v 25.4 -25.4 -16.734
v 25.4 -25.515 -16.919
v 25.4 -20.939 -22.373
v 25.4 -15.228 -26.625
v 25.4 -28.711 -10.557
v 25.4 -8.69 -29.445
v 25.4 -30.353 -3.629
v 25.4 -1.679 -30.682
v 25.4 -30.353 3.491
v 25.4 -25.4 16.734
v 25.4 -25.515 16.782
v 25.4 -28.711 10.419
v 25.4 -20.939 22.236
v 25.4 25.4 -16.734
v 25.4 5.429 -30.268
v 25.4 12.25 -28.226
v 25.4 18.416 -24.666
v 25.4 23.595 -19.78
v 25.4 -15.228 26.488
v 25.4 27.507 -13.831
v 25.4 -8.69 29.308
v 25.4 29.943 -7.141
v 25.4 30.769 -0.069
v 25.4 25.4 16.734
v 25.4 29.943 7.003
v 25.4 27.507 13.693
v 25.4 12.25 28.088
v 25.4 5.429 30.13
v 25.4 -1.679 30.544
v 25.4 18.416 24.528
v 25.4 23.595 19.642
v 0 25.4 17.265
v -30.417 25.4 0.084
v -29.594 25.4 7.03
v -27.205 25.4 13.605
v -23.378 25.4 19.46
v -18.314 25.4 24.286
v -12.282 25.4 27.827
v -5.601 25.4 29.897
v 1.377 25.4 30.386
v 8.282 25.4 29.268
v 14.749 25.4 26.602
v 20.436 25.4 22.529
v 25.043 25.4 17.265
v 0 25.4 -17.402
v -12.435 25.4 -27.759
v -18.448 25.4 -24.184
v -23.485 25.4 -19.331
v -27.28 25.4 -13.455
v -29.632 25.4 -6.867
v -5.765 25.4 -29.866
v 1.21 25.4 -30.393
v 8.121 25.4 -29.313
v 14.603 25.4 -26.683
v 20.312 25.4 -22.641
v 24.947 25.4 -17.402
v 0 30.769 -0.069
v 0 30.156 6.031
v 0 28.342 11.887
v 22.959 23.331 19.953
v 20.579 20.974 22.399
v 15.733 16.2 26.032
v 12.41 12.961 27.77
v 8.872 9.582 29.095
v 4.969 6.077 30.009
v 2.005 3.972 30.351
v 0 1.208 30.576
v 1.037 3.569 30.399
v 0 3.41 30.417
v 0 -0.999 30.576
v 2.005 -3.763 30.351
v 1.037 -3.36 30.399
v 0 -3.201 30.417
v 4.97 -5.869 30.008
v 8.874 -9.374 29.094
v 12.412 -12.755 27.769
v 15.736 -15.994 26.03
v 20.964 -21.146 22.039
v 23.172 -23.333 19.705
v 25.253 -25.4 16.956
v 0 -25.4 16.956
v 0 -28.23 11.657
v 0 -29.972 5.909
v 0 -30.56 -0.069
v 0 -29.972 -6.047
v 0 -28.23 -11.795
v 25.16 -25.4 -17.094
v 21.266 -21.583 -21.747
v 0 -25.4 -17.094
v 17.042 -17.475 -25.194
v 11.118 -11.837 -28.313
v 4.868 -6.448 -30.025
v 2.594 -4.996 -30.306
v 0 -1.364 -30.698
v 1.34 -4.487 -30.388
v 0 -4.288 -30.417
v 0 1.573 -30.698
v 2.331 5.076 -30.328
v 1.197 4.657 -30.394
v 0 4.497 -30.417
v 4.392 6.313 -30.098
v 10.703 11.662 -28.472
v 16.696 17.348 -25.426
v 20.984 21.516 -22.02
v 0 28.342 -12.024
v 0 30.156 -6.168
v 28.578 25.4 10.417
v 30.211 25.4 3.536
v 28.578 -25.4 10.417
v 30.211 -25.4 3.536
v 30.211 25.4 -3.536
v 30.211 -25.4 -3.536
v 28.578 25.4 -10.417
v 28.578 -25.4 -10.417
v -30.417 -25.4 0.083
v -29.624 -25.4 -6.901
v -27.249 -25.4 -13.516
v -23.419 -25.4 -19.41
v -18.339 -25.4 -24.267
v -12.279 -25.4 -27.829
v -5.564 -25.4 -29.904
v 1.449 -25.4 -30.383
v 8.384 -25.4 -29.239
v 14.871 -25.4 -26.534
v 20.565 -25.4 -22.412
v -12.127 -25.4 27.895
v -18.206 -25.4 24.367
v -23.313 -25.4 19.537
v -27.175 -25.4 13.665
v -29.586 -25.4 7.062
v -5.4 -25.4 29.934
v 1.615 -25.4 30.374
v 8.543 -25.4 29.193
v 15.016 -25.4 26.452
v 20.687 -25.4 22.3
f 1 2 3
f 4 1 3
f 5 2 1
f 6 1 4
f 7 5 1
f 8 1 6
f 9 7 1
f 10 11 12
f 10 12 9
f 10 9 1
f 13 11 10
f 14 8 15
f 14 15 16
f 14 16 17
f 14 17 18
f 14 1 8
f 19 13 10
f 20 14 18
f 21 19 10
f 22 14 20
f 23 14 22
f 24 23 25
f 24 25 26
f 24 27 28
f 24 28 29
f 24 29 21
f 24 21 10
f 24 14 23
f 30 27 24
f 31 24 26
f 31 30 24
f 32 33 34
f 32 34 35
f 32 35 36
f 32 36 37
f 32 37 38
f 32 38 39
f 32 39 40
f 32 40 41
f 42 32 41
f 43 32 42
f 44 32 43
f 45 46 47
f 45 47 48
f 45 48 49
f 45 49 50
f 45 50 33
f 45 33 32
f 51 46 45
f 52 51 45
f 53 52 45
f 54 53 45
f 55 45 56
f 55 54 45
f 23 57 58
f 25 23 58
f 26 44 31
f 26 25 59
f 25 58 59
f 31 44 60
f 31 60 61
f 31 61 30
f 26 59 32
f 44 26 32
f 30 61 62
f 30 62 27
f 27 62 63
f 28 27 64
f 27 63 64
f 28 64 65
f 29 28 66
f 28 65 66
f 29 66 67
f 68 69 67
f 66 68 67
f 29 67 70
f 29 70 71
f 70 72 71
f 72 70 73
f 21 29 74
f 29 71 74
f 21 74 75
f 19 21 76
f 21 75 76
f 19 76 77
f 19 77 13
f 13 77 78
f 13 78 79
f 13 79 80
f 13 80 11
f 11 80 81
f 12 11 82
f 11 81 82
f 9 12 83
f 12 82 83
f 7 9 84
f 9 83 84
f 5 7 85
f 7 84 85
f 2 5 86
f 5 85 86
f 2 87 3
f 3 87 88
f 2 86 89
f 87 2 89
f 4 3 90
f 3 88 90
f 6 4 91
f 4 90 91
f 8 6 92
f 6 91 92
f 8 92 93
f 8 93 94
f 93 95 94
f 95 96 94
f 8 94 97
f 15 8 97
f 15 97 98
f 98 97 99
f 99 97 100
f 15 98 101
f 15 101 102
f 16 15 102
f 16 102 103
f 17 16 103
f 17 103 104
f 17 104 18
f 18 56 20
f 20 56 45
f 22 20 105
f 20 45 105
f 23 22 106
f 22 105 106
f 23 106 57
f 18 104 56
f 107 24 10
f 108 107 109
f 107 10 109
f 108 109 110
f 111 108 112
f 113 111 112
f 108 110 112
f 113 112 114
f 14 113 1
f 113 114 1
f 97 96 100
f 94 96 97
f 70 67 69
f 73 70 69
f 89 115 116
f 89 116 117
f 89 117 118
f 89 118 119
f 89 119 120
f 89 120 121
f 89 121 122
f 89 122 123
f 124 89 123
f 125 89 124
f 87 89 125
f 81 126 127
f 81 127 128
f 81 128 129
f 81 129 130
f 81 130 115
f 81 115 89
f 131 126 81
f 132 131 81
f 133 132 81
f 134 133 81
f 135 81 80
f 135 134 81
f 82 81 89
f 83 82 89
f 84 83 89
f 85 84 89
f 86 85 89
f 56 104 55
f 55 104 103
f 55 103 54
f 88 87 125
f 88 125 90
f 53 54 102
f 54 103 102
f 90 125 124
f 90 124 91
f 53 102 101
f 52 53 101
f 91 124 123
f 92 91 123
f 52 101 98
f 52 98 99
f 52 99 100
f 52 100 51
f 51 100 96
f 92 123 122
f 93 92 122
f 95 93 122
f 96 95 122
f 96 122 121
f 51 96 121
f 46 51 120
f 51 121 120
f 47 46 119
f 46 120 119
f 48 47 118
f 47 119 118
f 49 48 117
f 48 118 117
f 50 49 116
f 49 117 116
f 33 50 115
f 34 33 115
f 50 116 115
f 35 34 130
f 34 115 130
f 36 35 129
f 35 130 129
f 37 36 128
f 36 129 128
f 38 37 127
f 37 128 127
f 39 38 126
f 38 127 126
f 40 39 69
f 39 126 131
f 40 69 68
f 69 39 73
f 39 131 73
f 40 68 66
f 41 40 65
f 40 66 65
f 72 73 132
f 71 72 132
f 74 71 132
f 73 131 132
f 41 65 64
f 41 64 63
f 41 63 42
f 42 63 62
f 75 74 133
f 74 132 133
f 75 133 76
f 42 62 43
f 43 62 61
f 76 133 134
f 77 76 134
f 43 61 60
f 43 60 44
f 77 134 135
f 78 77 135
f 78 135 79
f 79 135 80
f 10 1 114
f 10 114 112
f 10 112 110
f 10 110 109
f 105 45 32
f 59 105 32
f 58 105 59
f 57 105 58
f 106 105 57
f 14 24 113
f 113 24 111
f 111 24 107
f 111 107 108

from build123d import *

# Parameters (mm, degrees)
F0_R      = 30.41715
F2_DEPTH  = 25.4
F2_FACE_R = 30.41715
F3_DEPTH  = 25.4
F1_R      = 30.664626
F4_DEPTH  = 25.4


with BuildPart() as f2:
    # F0 (on Front) → F2 (new body)
    with BuildSketch(Plane.XZ):
        Circle(F0_R)
    extrude(amount=F2_DEPTH)

    # F2_face (on face) → F3 (join)
    with BuildSketch(Plane(origin=(0, 0, 0), x_dir=(1, 0, 0), z_dir=(0, 1, 0))):
        Circle(F2_FACE_R)
    extrude(amount=F3_DEPTH)

    # F1 (on Right) → F4 (join)
    with BuildSketch(Plane.YZ):
        with Locations((0.104457, -0.068773)):
            Circle(F1_R)
    extrude(amount=F4_DEPTH)


solid = f2.part
